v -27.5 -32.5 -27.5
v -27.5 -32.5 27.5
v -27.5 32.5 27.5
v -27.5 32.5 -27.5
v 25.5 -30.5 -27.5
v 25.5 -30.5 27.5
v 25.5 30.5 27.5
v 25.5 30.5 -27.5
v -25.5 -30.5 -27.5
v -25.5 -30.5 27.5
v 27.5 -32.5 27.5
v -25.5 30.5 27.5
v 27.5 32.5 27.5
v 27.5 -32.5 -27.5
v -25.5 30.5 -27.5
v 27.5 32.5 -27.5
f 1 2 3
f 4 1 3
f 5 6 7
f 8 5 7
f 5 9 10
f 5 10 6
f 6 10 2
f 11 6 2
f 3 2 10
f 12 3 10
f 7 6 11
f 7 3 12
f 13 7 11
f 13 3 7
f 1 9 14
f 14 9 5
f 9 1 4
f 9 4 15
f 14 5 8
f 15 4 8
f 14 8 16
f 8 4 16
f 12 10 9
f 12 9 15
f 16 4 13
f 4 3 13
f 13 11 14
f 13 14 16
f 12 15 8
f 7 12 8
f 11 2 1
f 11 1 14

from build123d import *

# Parameters (mm, degrees)
SKETCH1_W           = 55
SKETCH1_H           = 65
BOSS_EXTRUDE1_DEPTH = 27.5
SHELL1_T            = -2
SKETCH2_W           = 51
SKETCH2_H           = 61
CUT_EXTRUDE1_DEPTH  = 68.981615162


with BuildPart() as part:
    # Sketch1 → Boss-Extrude1 (new, symmetric)
    with BuildSketch(Plane.XY):
        Rectangle(SKETCH1_W, SKETCH1_H)
    extrude(amount=BOSS_EXTRUDE1_DEPTH, both=True)

    # Shell1
    shell1_openings = [part.faces().sort_by_distance(p)[0] for p in [
        (0, 0, 27.5),
    ]]
    offset(amount=SHELL1_T, openings=shell1_openings, kind=Kind.INTERSECTION)

    # Sketch2 → Cut-Extrude1 (cut, through all)
    with BuildSketch(Plane.XY.offset(-25.5)):
        Rectangle(SKETCH2_W, SKETCH2_H)
    extrude(amount=-CUT_EXTRUDE1_DEPTH, mode=Mode.SUBTRACT)


solid = part.part
